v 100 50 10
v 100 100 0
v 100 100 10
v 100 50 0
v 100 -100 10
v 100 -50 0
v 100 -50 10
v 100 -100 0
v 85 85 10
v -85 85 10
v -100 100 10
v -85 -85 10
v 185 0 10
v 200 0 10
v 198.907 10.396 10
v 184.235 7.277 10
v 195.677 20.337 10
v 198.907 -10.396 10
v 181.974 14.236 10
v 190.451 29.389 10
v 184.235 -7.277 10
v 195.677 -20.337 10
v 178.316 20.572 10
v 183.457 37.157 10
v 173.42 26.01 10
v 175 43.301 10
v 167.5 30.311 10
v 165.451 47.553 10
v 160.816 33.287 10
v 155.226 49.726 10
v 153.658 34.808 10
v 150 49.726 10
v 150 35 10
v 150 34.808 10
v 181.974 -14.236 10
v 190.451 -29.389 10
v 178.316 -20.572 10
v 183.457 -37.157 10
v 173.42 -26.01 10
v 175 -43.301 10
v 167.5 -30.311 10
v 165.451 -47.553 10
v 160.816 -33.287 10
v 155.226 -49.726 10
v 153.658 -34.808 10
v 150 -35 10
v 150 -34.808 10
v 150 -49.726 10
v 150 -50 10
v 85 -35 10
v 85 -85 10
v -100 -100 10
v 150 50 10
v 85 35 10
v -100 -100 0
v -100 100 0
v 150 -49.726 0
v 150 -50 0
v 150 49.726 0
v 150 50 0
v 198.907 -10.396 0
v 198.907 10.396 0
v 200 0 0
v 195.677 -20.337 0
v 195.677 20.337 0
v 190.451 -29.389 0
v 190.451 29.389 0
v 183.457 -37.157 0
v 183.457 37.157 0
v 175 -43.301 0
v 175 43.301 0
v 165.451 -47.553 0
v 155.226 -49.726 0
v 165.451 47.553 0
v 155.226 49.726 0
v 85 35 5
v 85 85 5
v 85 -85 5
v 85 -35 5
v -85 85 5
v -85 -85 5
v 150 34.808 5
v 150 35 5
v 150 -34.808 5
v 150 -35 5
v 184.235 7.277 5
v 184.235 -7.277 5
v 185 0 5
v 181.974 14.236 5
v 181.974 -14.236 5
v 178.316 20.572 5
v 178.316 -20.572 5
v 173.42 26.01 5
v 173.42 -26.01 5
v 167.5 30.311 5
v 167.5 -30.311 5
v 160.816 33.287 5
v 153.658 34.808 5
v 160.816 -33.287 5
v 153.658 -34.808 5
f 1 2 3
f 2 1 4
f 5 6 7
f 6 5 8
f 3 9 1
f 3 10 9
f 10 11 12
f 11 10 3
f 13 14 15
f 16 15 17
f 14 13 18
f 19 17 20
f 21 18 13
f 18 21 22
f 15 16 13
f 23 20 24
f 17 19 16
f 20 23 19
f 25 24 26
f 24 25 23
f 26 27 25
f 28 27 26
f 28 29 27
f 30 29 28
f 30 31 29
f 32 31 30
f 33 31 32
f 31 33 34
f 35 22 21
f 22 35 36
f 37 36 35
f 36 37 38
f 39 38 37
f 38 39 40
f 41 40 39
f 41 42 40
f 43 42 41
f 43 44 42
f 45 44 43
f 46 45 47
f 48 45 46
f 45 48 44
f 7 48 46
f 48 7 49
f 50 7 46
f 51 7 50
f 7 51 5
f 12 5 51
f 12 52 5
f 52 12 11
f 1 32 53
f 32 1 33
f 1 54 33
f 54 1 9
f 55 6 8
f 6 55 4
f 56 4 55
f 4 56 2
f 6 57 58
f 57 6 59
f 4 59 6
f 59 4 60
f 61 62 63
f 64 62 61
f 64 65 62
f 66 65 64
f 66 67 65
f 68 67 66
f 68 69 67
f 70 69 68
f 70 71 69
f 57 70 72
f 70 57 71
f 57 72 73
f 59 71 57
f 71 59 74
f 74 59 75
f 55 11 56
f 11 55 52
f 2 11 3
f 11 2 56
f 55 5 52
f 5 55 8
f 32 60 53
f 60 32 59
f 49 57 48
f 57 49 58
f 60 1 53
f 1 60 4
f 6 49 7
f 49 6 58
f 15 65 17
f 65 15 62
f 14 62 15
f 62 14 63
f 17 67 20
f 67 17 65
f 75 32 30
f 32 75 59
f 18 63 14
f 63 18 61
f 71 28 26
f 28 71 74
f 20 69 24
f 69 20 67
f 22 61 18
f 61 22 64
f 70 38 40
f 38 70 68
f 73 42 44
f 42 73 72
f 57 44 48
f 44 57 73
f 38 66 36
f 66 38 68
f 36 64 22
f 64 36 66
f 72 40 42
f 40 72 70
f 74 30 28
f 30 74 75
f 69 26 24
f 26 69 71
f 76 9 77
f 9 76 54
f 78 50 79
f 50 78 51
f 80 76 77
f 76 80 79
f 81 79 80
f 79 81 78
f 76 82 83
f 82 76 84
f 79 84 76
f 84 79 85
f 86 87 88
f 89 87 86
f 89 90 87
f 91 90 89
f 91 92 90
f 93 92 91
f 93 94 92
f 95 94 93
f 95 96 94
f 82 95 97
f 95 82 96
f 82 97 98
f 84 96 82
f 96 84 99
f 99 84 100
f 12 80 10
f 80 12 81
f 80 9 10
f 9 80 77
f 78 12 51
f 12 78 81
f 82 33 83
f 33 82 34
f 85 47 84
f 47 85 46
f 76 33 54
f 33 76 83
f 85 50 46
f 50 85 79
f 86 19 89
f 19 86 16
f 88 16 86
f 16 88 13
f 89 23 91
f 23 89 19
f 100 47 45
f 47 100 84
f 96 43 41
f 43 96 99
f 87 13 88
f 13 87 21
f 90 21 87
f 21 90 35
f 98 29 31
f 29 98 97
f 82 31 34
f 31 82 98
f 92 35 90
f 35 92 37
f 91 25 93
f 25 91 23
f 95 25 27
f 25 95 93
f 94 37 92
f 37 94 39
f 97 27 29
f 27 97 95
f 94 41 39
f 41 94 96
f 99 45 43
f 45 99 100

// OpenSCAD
// file: config.scad
plate_length=200;
plate_width=200;
ext_length=100;
ext_width=100;
height=10;
wall_thickness=15;

collar_height = 16;
collar_r = 46/2;

lid_thickness=3;


pcb_pocket_depth = 1;
pcb_length=100;
pcb_width=150;
// main file
include <config.scad>;

module base_body() {
	cube([plate_length, plate_width, height], center=true);
	translate([plate_length/2,0,0])
		cube([ext_length, ext_width, height], center=true);
	translate([plate_length/2 + ext_length/2,0,-height/2])
		cylinder(r=ext_width/2,h=height);
}

module base_pocket() {
	pocket_length = plate_length - wall_thickness * 2;
	pocket_width = plate_width - wall_thickness * 2;
	pocket_length_2 = ext_length - wall_thickness * 2;
	pocket_width_2 = ext_width - wall_thickness * 2;
	pocket_depth = height / 2;
	translate([0,0,pocket_depth])
		cube([pocket_length, pocket_width, height], center=true);
	translate([plate_length/2,0,pocket_depth])
		cube([ext_length, pocket_width_2, height], center=true);
	translate([plate_length/2 + ext_length/2,0,0])
		cylinder(r=(ext_width-wall_thickness*2)/2, h=10);
	
}

module base_plate() {
	translate([0,0,height/2])
	difference() {
		base_body();
		base_pocket();
	}
}

base_plate();


//vacuum_collar();
